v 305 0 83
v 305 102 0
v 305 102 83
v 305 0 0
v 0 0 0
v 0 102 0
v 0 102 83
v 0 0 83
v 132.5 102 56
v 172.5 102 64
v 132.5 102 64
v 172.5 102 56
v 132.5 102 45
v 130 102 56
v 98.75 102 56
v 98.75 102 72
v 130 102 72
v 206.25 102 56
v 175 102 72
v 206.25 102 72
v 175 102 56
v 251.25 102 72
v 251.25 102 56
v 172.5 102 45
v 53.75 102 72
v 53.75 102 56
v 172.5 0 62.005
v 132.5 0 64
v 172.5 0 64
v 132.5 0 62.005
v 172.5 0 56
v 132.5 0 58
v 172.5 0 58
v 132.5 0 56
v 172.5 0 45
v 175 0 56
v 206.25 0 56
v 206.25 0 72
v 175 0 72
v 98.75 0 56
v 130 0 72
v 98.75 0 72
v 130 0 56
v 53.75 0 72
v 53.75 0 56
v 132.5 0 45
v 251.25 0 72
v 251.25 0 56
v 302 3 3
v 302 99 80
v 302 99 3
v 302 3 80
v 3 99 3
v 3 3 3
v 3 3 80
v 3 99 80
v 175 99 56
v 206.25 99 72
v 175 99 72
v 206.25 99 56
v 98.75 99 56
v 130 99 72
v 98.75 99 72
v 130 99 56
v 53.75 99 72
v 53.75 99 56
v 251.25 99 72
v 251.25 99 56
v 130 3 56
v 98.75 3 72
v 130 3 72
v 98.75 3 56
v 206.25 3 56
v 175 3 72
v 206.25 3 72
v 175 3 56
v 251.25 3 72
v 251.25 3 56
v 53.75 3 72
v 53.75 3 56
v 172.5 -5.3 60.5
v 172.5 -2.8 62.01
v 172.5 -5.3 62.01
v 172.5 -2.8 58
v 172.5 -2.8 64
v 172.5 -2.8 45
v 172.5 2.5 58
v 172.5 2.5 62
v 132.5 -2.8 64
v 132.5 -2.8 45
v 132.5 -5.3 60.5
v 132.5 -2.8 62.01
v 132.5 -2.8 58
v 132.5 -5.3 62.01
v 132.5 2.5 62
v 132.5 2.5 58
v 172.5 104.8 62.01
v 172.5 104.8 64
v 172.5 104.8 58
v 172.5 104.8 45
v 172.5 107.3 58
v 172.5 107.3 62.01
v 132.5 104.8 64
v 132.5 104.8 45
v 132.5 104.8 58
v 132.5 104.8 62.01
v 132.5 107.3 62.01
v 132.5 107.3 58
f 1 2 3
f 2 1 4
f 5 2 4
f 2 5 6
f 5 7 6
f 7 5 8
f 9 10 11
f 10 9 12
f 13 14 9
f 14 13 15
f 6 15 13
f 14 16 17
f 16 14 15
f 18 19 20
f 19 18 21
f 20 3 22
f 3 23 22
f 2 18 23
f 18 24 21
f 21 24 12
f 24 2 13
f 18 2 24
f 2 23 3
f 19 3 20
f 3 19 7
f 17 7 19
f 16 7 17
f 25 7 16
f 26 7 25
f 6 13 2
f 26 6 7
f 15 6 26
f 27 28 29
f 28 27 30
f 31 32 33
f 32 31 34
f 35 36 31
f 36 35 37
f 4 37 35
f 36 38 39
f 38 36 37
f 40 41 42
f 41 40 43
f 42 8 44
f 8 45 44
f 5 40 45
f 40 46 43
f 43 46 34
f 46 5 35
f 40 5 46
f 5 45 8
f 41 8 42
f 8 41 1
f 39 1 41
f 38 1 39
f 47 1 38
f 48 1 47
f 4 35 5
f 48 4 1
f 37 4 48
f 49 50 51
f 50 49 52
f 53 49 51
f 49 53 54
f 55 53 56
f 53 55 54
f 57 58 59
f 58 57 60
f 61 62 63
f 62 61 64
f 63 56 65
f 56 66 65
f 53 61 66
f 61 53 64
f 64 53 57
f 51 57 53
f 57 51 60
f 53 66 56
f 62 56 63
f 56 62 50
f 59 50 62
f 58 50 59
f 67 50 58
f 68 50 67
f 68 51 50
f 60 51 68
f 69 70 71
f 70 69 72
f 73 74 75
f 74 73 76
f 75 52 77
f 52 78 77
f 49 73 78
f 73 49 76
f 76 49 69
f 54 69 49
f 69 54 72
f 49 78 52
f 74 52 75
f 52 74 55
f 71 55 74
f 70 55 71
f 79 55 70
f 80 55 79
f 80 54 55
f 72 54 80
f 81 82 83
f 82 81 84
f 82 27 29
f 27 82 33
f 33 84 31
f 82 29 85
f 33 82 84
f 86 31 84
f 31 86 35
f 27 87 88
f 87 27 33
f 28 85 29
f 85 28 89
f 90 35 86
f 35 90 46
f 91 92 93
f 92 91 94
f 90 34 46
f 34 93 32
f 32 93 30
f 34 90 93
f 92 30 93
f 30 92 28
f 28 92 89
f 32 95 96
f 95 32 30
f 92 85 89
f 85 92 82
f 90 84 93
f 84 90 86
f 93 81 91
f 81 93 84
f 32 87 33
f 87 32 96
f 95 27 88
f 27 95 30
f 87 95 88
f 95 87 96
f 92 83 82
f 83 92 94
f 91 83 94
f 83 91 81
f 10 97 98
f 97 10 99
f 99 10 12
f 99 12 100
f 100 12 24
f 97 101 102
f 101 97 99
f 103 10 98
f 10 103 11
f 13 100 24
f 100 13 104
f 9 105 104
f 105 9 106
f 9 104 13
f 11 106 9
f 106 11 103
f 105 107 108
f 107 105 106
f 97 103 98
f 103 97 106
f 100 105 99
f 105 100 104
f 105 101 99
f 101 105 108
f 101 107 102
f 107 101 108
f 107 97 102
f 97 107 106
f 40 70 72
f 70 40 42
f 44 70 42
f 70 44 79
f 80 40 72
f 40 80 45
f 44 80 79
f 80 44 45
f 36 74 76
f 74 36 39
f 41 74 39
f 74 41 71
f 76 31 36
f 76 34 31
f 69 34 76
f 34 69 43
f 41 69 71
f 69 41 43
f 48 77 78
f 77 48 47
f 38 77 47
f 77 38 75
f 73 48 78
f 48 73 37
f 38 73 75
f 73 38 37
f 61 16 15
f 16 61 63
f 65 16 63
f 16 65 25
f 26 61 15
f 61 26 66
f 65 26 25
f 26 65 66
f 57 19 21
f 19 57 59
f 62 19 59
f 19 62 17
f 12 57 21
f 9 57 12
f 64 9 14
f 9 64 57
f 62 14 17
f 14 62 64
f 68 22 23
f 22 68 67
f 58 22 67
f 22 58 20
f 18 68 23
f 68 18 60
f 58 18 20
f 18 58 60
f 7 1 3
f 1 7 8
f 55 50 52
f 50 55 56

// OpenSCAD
// 01_tall_finger.scad
// RETROFIT ATTACHMENT — Version 1: Single Tall Finger per Side
//
// NEW tray (z=0..50, blue) has ONE wide upward finger on EACH long-side
// outer face, rising past the top tray wall and hooking inward into the
// CENTER window (window 1) of the TOP tray.
//
// TOP tray (z=50..83, grey) is FIXED — ZERO geometry added to it.
// All attachment features live ONLY on the NEW tray.
//
// explode=0 → engaged   explode=1 → parts separated for inspection

explode = 0;   // change to 1 for exploded view

// ── Global dimensions ─────────────────────────────────────────────────────
W    = 305;   // tray length (X)
D    = 102;   // tray depth (Y)
Hn   = 50;    // new tray height
Ht   = 33;    // top tray height
wall = 3;     // wall thickness (both trays)

// ── Top-tray window geometry (EXISTING features — read-only) ──────────────
win_w  = 45;   // window width  (X)
win_h  = 16;   // window height (Z)
win_zc = 64;   // window centre Z (absolute)
// 3 windows per long side, evenly spaced:  X = W/4, W/2, 3W/4
function win_cx(i) = W * (i+1) / 4;   // i = 0,1,2

// ── Clip geometry (all on NEW tray) ───────────────────────────────────────
fng_t    = 2.8;   // finger wall thickness
fng_w    = 40;    // finger width (X)  — slightly less than win_w
root_z   = 5;     // how far the finger base drops below new-tray top
hook_dep = 2.5;   // inward hook depth (engages window edge)
hook_h   = 4.0;   // hook block height
lead_in  = 1.5;   // chamfer on hook leading edge

// Absolute Z of hook bottom (engages lower half of window)
hook_z = win_zc - win_h/2 + 2;   // 2 mm above window lower edge

// ── Explode offset ────────────────────────────────────────────────────────
expl = 45 * explode;

// ── Colors ────────────────────────────────────────────────────────────────
c_new  = [0.22, 0.55, 0.85, 1.00];   // blue   – new tray
c_top  = [0.80, 0.80, 0.80, 0.80];   // grey   – top tray (semi-transparent)
c_clip = [0.95, 0.42, 0.08, 1.00];   // orange – fingers/clips

// ═══════════════════════════════════════════════════════════════════════════
// TOP TRAY  — FIXED, modelled only for context (never modified)
// ═══════════════════════════════════════════════════════════════════════════
module top_tray() {
    color(c_top)
    translate([0, 0, Hn + expl])
    difference() {
        cube([W, D, Ht]);
        // hollow interior (open top)
        translate([wall, wall, -0.01])
            cube([W-2*wall, D-2*wall, Ht-wall+0.01]);
        // 3 windows on front wall (y=0)
        for (i=[0:2]) {
            translate([win_cx(i)-win_w/2, -0.01, (win_zc-Hn)-win_h/2])
                cube([win_w, wall+0.02, win_h]);
        }
        // 3 windows on back wall (y=D)
        for (i=[0:2]) {
            translate([win_cx(i)-win_w/2, D-wall-0.01, (win_zc-Hn)-win_h/2])
                cube([win_w, wall+0.02, win_h]);
        }
    }
}

// ═══════════════════════════════════════════════════════════════════════════
// NEW TRAY BODY  — hollow box, no top face
// ═══════════════════════════════════════════════════════════════════════════
module new_tray_body() {
    color(c_new)
    difference() {
        cube([W, D, Hn]);
        translate([wall, wall, wall])
            cube([W-2*wall, D-2*wall, Hn]);  // open top
    }
}

// ═══════════════════════════════════════════════════════════════════════════
// TALL FINGER CLIP  (attached to NEW tray, hooks TOP tray center window)
// side=0 → front face (Y=0), side=1 → back face (Y=D)
// ═══════════════════════════════════════════════════════════════════════════
module tall_finger(side) {
    cx    = win_cx(1);                       // center window
    y0    = (side==0) ? -fng_t : D;          // outer face position
    inwd  = (side==0) ? 1 : -1;              // inward direction in Y

    color(c_clip) {
        // ── vertical stem, roots 'root_z' below tray top ──────────────────
        stem_bot = Hn - root_z;
        stem_top = hook_z + hook_h + 2;      // just above hook
        translate([cx - fng_w/2, y0, stem_bot])
            cube([fng_w, fng_t, stem_top - stem_bot]);

        // ── inward hook nose with chamfered lead-in ────────────────────────
        // Hull: full hook depth at bottom, taper to flush at top
        translate([cx - fng_w/2, y0, hook_z])
        hull() {
            cube([fng_w, fng_t + hook_dep, hook_h]);
            translate([0, inwd * (-hook_dep), hook_h - lead_in])
                cube([fng_w, fng_t, lead_in + 0.01]);
        }
    }
}

// ═══════════════════════════════════════════════════════════════════════════
// ASSEMBLY
// ═══════════════════════════════════════════════════════════════════════════
new_tray_body();
tall_finger(0);   // front
tall_finger(1);   // back
top_tray();
